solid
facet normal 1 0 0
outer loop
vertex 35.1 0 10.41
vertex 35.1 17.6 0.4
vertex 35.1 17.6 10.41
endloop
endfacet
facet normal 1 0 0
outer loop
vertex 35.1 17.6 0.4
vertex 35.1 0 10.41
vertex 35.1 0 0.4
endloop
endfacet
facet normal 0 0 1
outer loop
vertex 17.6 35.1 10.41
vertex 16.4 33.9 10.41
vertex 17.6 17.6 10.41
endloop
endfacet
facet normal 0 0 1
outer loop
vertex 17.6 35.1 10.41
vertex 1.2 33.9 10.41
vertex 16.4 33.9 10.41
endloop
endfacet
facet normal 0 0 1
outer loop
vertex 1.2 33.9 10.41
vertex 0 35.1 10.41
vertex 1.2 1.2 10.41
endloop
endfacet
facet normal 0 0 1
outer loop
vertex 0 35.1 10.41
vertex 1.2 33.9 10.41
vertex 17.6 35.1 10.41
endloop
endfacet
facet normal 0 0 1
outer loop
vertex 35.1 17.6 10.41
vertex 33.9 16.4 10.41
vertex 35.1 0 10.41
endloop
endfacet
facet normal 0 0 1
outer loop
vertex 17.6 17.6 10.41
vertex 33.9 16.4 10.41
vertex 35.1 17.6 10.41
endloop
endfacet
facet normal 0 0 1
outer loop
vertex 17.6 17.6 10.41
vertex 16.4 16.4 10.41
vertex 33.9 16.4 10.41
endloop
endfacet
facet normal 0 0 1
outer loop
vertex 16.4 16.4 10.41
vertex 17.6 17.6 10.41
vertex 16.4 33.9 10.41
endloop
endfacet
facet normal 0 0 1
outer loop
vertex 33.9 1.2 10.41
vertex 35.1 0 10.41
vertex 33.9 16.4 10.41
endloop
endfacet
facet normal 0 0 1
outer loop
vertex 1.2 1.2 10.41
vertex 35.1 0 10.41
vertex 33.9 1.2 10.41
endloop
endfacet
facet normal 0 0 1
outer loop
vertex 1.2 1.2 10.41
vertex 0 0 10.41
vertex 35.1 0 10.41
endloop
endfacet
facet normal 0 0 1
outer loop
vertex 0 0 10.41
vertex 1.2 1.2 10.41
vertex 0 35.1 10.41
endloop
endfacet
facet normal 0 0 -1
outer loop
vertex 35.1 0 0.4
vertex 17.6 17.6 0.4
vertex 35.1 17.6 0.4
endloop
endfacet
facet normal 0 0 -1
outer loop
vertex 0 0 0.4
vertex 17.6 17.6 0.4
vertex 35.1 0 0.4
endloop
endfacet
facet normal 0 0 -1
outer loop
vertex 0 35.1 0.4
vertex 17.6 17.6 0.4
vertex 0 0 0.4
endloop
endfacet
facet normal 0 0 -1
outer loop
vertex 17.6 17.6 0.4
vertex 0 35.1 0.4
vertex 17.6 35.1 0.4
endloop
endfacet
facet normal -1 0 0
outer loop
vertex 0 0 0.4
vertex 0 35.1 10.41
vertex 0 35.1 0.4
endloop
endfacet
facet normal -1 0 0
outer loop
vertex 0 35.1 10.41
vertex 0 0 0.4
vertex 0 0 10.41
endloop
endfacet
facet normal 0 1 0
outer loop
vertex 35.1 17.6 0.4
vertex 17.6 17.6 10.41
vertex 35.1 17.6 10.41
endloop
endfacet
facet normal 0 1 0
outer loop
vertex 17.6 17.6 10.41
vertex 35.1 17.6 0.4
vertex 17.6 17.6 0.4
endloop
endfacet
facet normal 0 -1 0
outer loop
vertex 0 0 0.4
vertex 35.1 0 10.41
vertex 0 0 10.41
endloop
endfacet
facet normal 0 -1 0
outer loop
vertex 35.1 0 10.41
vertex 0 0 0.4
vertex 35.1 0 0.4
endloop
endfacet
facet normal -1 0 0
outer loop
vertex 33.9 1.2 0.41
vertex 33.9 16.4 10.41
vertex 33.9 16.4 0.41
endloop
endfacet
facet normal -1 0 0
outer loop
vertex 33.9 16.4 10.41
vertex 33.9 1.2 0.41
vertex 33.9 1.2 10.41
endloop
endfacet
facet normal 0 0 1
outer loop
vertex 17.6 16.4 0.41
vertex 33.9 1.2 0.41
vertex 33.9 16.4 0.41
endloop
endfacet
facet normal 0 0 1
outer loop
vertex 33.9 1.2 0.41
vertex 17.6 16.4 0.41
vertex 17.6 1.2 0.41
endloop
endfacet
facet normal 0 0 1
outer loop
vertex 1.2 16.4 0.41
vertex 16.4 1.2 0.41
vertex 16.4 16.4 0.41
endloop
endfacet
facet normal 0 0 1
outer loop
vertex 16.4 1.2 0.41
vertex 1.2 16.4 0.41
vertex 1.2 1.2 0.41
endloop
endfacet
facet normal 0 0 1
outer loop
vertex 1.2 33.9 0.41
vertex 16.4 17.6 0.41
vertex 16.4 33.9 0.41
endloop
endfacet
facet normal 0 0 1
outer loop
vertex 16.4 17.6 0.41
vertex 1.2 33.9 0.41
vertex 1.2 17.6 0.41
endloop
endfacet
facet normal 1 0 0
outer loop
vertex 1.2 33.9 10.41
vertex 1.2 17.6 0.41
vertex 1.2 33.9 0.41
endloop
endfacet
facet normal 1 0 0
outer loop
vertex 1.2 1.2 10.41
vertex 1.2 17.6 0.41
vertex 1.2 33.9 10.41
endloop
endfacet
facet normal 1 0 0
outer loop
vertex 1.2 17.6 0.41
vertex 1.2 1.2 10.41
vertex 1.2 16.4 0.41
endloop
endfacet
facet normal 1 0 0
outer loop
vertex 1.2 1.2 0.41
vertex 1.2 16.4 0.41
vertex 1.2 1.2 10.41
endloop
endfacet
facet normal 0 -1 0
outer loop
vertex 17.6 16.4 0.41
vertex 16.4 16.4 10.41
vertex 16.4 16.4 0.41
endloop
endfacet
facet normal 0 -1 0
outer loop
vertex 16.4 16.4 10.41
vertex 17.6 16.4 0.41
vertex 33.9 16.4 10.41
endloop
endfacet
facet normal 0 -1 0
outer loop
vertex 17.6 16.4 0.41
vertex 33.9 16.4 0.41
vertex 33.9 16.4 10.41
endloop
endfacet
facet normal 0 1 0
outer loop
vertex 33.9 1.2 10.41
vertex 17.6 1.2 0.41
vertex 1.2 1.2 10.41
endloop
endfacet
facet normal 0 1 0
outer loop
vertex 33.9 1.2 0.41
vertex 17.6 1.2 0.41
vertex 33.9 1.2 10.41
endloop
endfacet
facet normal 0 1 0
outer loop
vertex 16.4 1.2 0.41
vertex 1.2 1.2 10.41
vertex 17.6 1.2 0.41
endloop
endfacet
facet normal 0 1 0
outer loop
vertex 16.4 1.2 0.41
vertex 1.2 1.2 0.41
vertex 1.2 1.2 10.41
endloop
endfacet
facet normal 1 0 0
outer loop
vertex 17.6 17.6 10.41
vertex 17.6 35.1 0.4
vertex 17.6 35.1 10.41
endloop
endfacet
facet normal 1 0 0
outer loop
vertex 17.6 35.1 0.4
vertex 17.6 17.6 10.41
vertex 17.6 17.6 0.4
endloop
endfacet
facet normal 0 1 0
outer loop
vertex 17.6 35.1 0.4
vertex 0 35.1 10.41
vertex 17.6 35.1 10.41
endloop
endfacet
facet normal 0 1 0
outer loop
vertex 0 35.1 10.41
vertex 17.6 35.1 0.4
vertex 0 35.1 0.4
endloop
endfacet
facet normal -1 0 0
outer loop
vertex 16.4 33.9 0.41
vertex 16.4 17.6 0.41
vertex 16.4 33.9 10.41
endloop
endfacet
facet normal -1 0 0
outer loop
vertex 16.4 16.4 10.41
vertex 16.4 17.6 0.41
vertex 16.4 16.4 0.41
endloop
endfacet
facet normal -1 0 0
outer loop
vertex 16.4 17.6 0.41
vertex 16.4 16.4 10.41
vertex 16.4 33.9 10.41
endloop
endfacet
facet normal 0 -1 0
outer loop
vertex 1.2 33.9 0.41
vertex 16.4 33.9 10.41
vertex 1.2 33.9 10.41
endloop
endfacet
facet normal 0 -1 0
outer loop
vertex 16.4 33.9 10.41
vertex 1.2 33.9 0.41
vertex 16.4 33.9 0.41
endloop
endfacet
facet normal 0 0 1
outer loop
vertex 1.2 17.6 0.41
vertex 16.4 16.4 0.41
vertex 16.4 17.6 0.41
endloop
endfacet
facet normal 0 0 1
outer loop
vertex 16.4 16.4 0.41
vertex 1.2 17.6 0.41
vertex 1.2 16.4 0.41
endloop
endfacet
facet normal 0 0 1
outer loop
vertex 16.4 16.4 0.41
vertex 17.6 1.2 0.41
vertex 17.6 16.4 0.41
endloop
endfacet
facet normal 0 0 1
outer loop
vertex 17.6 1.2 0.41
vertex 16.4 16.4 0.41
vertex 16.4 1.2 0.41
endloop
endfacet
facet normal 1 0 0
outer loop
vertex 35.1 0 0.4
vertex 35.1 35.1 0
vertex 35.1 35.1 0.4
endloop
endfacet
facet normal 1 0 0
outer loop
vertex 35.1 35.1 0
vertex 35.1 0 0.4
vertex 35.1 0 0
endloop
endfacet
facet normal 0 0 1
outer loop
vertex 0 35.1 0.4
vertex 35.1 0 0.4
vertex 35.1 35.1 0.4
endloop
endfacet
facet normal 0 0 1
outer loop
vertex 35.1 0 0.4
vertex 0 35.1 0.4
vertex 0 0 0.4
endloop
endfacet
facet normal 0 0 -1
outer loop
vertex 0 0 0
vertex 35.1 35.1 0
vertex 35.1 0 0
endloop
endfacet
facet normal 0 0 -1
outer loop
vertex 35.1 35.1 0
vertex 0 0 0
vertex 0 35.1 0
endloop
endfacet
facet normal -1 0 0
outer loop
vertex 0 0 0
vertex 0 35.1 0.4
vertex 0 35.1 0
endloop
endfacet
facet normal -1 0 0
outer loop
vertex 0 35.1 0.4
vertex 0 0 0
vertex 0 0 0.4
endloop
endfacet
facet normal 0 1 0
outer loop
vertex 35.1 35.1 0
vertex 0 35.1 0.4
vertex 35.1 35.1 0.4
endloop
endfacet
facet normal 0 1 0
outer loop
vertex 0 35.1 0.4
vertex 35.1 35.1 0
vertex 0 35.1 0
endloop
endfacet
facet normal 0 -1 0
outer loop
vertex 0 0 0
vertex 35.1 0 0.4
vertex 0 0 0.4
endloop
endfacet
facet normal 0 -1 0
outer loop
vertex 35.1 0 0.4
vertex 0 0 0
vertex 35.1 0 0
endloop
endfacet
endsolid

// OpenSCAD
// file: ../../Base/Boxes.scad
// Fischertechnik Box Foundation
// Pre-designed Boxes

use <Constants.scad>

include <PlacementOptions.scad>

box190Width = 190;
box190Depth = 130;
box130Width = 130;
box130Depth = 95;
boxUsageHeight = 33.9;
boxWallThickness = 2.4;
boxBaseThickness = 1.0;
boxWebWidth = 3.0;

// getBoxWallThickness()
// Gets the wall thickness of a Fischertechnik Box

function getBoxWallThickness() = boxWallThickness;

// Gets the usable height of a fischertechnik box
function getBoxUsageHeight() = boxUsageHeight;

// Gets the thickness of the Fischertechnik box base.
function getBoxBaseThickness() = boxBaseThickness;

// Gets the width of a box web
function getBoxWebWidth() = boxWebWidth;

// Gets the usable inner space of a Box 190 as an x/y-list
function getBox190Space() = [
    box190Width - 2*getBoxWallThickness(), 
    box190Depth - 2*getBoxWallThickness() ];

// Imports the Fischertechnik empty box 130x190 mm and places it at position 0,0
// 190x130 are the outer sizes, the inner space is slightly smaller. Use getBox190Space() to get the inner sizes.
// This module needs the STL file "Fischertechnik Box 130x190.stl" in the library path.
// The box is positioned that the usable inner space is at the 0,0,0 position. The

module Box190() {
    translate([-getBoxWallThickness(),-getBoxWallThickness(),-getBoxBaseThickness()])
        import("Fischertechnik Box 130x190.stl", convexity=3);
}

// Gets the usable inner space of a Box 130 as an x/y-list
function getBox130Space() = [
    box130Width - 2*getBoxWallThickness(), 
    box130Depth - 2*getBoxWallThickness() ];

// Imports the Fischertechnik empty box 95x130 mm and places it at position 0,0
// 190x130 are the outer sizes, the inner space is slightly smaller. Use getBox190Space() to get the inner sizes.
// This module needs the STL file "Fischertechnik Box 95x130.stl" in the library path.
// The box is positioned that the usable inner space is at the 0,0,0 position. The

module Box130() {
    translate([-getBoxWallThickness(),-getBoxWallThickness(),-getBoxBaseThickness()])
        import("Fischertechnik Box 95x130.stl", convexity=3);
}

// Creates a web at the specified box walls
// corner 0 = LowerLeft, 1 = UpperLeft, 2 = UpperRight, 3 = LowerRight
// side 0 = LeftOfCorner, 1 = RightOfCorner
// distance = Distance in mm from the corner
// box = inner width and depth of the box (default: Box 190)
// webWidth = length of the web (default is 3 mms)
// webThickness = thickness of the web (default is 1 mm)

module BoxWeb(corner, side, distance, box=getBox190Space(), webWidth=getBoxWebWidth(), webThickness=1.0) {
    sink = getBoxWallThickness()/2;

    width = (corner % 2 == 0) ? 
            (side == LeftOfCorner ? webWidth : webThickness) :
            (side == LeftOfCorner ? webThickness : webWidth);

    depth = (corner % 2 == 0) ? 
            (side == RightOfCorner ? webWidth : webThickness) :
            (side == RightOfCorner ? webThickness : webWidth);
    
    xDiff = corner == LowerLeft ? 
                (side == LeftOfCorner ? -sink : distance) :
            (corner == UpperLeft ?                
                (side == LeftOfCorner ? distance : -sink) :
            (corner == UpperRight ?
                (side == LeftOfCorner ? box.x-webWidth+sink : box.x-distance-webThickness) :
                (side == LeftOfCorner ? box.x-distance-webThickness: box.x-webWidth+sink)));

    yDiff = corner == LowerLeft ? 
                (side == RightOfCorner ? -sink : distance) :
            (corner == UpperLeft ?
                (side == RightOfCorner ? box.y-distance : box.y-webWidth+sink) :
            (corner == UpperRight ?
                (side == RightOfCorner ? box.y-webWidth+sink : box.y-distance) :
                (side == RightOfCorner ? distance : -sink)));
    
    translate([xDiff, yDiff, -getExcess()])
        cube([width, depth, boxUsageHeight + 2*getExcess()]);
}
// file: ../../Base/Rotation.scad
// Fischertechnik Box Foundation
// Geometry Helpers Rotation

include <PlacementOptions.scad>

// getRotatedSpace(space, rotation=NoRotation)
// Rotates the space dependent on the specified rotation

function getRotatedSpace(space, rotation=NoRotation) = [
    (rotation == Rotate90 || rotation == Rotate270) ? space.y : space.x,
    (rotation == Rotate90 || rotation == Rotate270) ? space.x : space.y
];

// Rotates the given space around the fixed left lower corner
// space = the space the children needs as width/depth list [width,depth]
// rotation = 0 Rotate0 degrees, 1 Rotate90 degrees, 2 Rotate180 degrees, 3 Rotate270 degrees (equivalent to -90)

module RotateFix(space, rotation=Rotate0) {
    dy = (rotation == Rotate0 || rotation == Rotate270) ? 0 :
        (rotation == Rotate90) ? space.x :
        space.y;
    dx = (rotation < Rotate180) ? 0 :
        (rotation == Rotate180) ? space.x :
        space.y;
    
    translate([dx, dy, 0])
        rotate([0, 0, rotations[rotation]])
            children();
}
// file: ../../Base/Alignment.scad
// Fischertechnik Box Foundation
// Geometry Helpers Alignment

include <PlacementOptions.scad>

// getAlignedX(elementWidth, spaceWidth, align=AlignRight, offset=0)
// Gets the aligned X offset of an element with the given
// width in the given space.
// elementWidth = The width of the element to positon
// spaceWidth = The space where the element should be aligned
// align = 0 AlignLeft, 1 AlignCenter, 2 AlignRight
// offset = an optional offset from the aligned position. When
// aligned left or centered, then positive values are in X direction.
// When aligned right then positive values are in negative X direction.

function getAlignedX(elementWidth, spaceWidth, align=AlignRight, offset=0) =
    (align == AlignLeft) ?
        offset :
        ((align == AlignCenter) ?
        (spaceWidth - elementWidth)/2 + offset :
        spaceWidth - offset - elementWidth);

// getAlignedY(elementDepth, spaceDepth, align=AlignTop, offset=0)
// Gets the aligned Y offset of an element with the given
// depth in the given space.
// elementDepth = The depth of the element to positon
// spaceDepth = The space where the element should be aligned
// align = 0 AlignBottom, 1 AlignCenter, 2 AlignTop
// offset = an optional offset from the aligned position. When
// aligned bottom or centered, then positive values are in Y direction.
// When aligned top then positive values are in negative Y direction.

function getAlignedY(elementDepth, spaceDepth, align=AlignTop, offset=0) =
    (align == AlignBottom) ?
        offset :
        ((align == AlignCenter) ?
        (spaceDepth - elementDepth)/2 + offset :
        spaceDepth - offset - elementDepth);
// file: ../../Base/PlacementOptions.scad
// Fischertechnik Box Foundation
// Placement Options

// Alignment
NoAlign = 0;
AlignLeft = 1;
AlignBottom = 2;
AlignCenter = 3;
AlignRight = 4;
AlignTop = 5;

// Element rotation degree steps
rotations = [0, -90, -180, -270];

// Rotation
NoRotation = 0;
Rotate0 = 0;
Rotate90 = 1;
Rotate180 = 2;
Rotate270 = 3;

// Docking (seen from above)
NoDock = -1;
DockLeft = 0;
DockTop = 1;
DockRight = 2;
DockCorner = 2;
DockBottom = 3;

// Web corners
LowerLeft = 0;
UpperLeft = 1;
UpperRight = 2;
LowerRight = 3;

// Web position relative to corner
LeftOfCorner = 0;
RightOfCorner = 1;
// file: ../../Base/Placement.scad
// Fischertechnik Box Foundation
// Geometry Helpers Placement

use <Constants.scad>
use <Alignment.scad>
use <Rotation.scad>
use <Boxes.scad>

include <PlacementOptions.scad>

// Place(x=0, y=0, elementSpace=[0,0], alignX=AlignLeft, alignY=AlignBottom, rotation=Rotate0, boxSpace=getBox190Space())
// Places the child at the specified position
// y = Y-Position. This is a relative position when an X aligment is specified.
// x = X-Position. This is a relative position when an Y aligment is specified.
// elementSpace = space of the element to be placed [x,y]
// alignX = -1=NoAlign, 0 AlignLeft, 1 AlignCenter, 3 AlignRight (elementSpace and boxSpace required!)
// alignY = -1=NoAlign, 2 AlignBottom, 1 AlignCenter, 4 AlignTop (elementSpace and boxSpace required!)
// rotation = 0 Rotate0 0 degrees, 1 Rotate90 90 degrees, 
// 2 Rotate180 180 degrees, 3 Rotate270 270 degrees (equivalent to -90)
// boxSpace = Inner space of the box where the placement occurs [x,y] - default is Box 190x130 inner space

module Place(x=0, y=0, elementSpace=[0,0], 
  alignX=AlignLeft, alignY=AlignBottom, 
  rotation=NoRotation, boxSpace=getBox190Space()) {

    module Position(x, y, space, rotation=Rotate0) {
        translate([x, y, 0])
            RotateFix(space, rotation)
                children();
    }

    space = getRotatedSpace(elementSpace, rotation);
    alignedX = getAlignedX(space.x, boxSpace.x, alignX, x);
    alignedY = getAlignedY(space.y, boxSpace.y, alignY, y);
    Position(alignedX, alignedY, elementSpace, rotation)
        children();
}

// Center(space=getBox130Space(), elementSpace=[0,0])
// space = Space where the children is centered. For cylinder use centered=true and no elementSpace.
// elementSpace = space of the element to be centered [x,y]

module Center(space=getBox190Space(), elementSpace=[0,0]) {
    translate([(space.x - elementSpace.x) / 2, (space.y - elementSpace.y) / 2])
        children(0);
}

// CenterHorizontal(width=0, y=0, offset=0, space=getBox130Space())
// space = Space where the children is centered. For cylinder use centered=true and no elementSpace.
// elementSpace = space of the element to be centered [x,y]

module CenterHorizontal(width=0, y=0, offset=0, space=getBox190Space()) {
    translate([(space.x - width) / 2 + offset, y])
        children(0);
}

// CenterVertical(depth=0, x=0, offset=0, space=getBox130Space())
// space = Space where the children is centered. For cylinder use centered=true and no elementSpace.
// elementSpace = space of the element to be centered [x,y]

module CenterVertical(depth=0, x=0, offset=0, space=getBox190Space()) {
    translate([x, (space.y - depth) / 2 + offset])
        children(0);
}
// file: ../../Elements/AxisClip10.scad
// Fischertechnik Box Library
// Axis for clip 10
// 31023

use <../ModelBase/Simple.scad>

width = 12;
depth = 12;
height = 23;

// getAxisClip10Space()
// Gets the space of a frame for a clip 10 with spring ring (mot2)

function getAxisClip10Space() = [width, depth, height];

// AxisClip10()
// Axis for clip 10 with spring ring (mot2)

module AxisClip10() {
    LeveledAxisWithSpace(height, height-10, getAxisClip10Space());
}

// Tests
color("lightgray")
AxisClip10();
// file: ../../Base/Constants.scad
// Fischertechnik Box Foundation
// Constants

// Constant values necessary for multiple elements

// Base constants
dividerThickness = 1.2;
excess = 0.01;
fragments = 90;
tolerance = 0.8;

// Gets the thickness of a divider 
function getDividerThickness() = dividerThickness;

// Gets the excess that is used to merge walls into each other
function getExcess() = excess;

// Gets amount of fragments of a cylinder
function getFragments() = fragments;

// Gets the inner tolerance of a frame to each side
function getTolerance() = tolerance;


// Fischertechnik specific constants
axisDiameter = 4;
axisBottomDiameter = axisDiameter + 1;
standardEdgeDistance = 2.5;
standardWebDistance = 11.5;
standardCornerLength = 15;
tubeWallFactor = 0.8;

// Gets axis diameter
function getAxisDiameter() = axisDiameter;

// Gets axis bottom diameter for thicker part at the bottom
function getAxisBottomDiameter() = axisBottomDiameter;

// gets the standard distance to the wall of the box for dockable frames with webs
function getStandardEdgeDistance() = standardEdgeDistance;

// gets the standard distance of each web to the corner of the dockable frame
function getStandardWebDistance() = standardWebDistance;

// gets the standard length of the corner walls of a dockable frame
function getStandardCornerLength() = standardCornerLength;

// gets the wall thickness of a tube.
function getTubeWallThickness() = tubeWallFactor * getDividerThickness();
// file: ../../Elements/FrameJointBlock.scad
// Fischertechnik Box Library
// Frame for joint block
// 31008, 31009, 31308, 35831, 36223, 172804, 172805

use <../ModelBase/Simple.scad>

width = 32.5;
depth = 15;
height = 10;
tolerance = 0.2;

// getFrameJointBlockSpace()
// Gets the complete space of the joint block frame

function getFrameJointBlockSpace() = getAngledFrameOuterVolume(width, depth, width, depth, height, tolerance = tolerance);

// FrameJointBlock()
// Frame for a joint block

module FrameJointBlock() {
    AngledFrame(width, depth, width, depth, height, tolerance=tolerance);
}

// Test
color("lightgray")
FrameJointBlock();
// file: ../TestPrint.scad
// 3D Print Test Base

use <../Base/Constants.scad>

use <../Elements/AxisClip10.scad>

module TestPrint(elementSpace) {
    cube([elementSpace.x, elementSpace.y, 0.4]);
    translate([0,0,0.4+getExcess()]) {
        children();
    }
}

TestPrint(getAxisClip10Space())
    AxisClip10();
// main file
// 3D Print Test Base
// FrameJointBlock

use <../TestPrint.scad>
use <../../Elements/FrameJointBlock.scad>

TestPrint(getFrameJointBlockSpace())
    FrameJointBlock();
